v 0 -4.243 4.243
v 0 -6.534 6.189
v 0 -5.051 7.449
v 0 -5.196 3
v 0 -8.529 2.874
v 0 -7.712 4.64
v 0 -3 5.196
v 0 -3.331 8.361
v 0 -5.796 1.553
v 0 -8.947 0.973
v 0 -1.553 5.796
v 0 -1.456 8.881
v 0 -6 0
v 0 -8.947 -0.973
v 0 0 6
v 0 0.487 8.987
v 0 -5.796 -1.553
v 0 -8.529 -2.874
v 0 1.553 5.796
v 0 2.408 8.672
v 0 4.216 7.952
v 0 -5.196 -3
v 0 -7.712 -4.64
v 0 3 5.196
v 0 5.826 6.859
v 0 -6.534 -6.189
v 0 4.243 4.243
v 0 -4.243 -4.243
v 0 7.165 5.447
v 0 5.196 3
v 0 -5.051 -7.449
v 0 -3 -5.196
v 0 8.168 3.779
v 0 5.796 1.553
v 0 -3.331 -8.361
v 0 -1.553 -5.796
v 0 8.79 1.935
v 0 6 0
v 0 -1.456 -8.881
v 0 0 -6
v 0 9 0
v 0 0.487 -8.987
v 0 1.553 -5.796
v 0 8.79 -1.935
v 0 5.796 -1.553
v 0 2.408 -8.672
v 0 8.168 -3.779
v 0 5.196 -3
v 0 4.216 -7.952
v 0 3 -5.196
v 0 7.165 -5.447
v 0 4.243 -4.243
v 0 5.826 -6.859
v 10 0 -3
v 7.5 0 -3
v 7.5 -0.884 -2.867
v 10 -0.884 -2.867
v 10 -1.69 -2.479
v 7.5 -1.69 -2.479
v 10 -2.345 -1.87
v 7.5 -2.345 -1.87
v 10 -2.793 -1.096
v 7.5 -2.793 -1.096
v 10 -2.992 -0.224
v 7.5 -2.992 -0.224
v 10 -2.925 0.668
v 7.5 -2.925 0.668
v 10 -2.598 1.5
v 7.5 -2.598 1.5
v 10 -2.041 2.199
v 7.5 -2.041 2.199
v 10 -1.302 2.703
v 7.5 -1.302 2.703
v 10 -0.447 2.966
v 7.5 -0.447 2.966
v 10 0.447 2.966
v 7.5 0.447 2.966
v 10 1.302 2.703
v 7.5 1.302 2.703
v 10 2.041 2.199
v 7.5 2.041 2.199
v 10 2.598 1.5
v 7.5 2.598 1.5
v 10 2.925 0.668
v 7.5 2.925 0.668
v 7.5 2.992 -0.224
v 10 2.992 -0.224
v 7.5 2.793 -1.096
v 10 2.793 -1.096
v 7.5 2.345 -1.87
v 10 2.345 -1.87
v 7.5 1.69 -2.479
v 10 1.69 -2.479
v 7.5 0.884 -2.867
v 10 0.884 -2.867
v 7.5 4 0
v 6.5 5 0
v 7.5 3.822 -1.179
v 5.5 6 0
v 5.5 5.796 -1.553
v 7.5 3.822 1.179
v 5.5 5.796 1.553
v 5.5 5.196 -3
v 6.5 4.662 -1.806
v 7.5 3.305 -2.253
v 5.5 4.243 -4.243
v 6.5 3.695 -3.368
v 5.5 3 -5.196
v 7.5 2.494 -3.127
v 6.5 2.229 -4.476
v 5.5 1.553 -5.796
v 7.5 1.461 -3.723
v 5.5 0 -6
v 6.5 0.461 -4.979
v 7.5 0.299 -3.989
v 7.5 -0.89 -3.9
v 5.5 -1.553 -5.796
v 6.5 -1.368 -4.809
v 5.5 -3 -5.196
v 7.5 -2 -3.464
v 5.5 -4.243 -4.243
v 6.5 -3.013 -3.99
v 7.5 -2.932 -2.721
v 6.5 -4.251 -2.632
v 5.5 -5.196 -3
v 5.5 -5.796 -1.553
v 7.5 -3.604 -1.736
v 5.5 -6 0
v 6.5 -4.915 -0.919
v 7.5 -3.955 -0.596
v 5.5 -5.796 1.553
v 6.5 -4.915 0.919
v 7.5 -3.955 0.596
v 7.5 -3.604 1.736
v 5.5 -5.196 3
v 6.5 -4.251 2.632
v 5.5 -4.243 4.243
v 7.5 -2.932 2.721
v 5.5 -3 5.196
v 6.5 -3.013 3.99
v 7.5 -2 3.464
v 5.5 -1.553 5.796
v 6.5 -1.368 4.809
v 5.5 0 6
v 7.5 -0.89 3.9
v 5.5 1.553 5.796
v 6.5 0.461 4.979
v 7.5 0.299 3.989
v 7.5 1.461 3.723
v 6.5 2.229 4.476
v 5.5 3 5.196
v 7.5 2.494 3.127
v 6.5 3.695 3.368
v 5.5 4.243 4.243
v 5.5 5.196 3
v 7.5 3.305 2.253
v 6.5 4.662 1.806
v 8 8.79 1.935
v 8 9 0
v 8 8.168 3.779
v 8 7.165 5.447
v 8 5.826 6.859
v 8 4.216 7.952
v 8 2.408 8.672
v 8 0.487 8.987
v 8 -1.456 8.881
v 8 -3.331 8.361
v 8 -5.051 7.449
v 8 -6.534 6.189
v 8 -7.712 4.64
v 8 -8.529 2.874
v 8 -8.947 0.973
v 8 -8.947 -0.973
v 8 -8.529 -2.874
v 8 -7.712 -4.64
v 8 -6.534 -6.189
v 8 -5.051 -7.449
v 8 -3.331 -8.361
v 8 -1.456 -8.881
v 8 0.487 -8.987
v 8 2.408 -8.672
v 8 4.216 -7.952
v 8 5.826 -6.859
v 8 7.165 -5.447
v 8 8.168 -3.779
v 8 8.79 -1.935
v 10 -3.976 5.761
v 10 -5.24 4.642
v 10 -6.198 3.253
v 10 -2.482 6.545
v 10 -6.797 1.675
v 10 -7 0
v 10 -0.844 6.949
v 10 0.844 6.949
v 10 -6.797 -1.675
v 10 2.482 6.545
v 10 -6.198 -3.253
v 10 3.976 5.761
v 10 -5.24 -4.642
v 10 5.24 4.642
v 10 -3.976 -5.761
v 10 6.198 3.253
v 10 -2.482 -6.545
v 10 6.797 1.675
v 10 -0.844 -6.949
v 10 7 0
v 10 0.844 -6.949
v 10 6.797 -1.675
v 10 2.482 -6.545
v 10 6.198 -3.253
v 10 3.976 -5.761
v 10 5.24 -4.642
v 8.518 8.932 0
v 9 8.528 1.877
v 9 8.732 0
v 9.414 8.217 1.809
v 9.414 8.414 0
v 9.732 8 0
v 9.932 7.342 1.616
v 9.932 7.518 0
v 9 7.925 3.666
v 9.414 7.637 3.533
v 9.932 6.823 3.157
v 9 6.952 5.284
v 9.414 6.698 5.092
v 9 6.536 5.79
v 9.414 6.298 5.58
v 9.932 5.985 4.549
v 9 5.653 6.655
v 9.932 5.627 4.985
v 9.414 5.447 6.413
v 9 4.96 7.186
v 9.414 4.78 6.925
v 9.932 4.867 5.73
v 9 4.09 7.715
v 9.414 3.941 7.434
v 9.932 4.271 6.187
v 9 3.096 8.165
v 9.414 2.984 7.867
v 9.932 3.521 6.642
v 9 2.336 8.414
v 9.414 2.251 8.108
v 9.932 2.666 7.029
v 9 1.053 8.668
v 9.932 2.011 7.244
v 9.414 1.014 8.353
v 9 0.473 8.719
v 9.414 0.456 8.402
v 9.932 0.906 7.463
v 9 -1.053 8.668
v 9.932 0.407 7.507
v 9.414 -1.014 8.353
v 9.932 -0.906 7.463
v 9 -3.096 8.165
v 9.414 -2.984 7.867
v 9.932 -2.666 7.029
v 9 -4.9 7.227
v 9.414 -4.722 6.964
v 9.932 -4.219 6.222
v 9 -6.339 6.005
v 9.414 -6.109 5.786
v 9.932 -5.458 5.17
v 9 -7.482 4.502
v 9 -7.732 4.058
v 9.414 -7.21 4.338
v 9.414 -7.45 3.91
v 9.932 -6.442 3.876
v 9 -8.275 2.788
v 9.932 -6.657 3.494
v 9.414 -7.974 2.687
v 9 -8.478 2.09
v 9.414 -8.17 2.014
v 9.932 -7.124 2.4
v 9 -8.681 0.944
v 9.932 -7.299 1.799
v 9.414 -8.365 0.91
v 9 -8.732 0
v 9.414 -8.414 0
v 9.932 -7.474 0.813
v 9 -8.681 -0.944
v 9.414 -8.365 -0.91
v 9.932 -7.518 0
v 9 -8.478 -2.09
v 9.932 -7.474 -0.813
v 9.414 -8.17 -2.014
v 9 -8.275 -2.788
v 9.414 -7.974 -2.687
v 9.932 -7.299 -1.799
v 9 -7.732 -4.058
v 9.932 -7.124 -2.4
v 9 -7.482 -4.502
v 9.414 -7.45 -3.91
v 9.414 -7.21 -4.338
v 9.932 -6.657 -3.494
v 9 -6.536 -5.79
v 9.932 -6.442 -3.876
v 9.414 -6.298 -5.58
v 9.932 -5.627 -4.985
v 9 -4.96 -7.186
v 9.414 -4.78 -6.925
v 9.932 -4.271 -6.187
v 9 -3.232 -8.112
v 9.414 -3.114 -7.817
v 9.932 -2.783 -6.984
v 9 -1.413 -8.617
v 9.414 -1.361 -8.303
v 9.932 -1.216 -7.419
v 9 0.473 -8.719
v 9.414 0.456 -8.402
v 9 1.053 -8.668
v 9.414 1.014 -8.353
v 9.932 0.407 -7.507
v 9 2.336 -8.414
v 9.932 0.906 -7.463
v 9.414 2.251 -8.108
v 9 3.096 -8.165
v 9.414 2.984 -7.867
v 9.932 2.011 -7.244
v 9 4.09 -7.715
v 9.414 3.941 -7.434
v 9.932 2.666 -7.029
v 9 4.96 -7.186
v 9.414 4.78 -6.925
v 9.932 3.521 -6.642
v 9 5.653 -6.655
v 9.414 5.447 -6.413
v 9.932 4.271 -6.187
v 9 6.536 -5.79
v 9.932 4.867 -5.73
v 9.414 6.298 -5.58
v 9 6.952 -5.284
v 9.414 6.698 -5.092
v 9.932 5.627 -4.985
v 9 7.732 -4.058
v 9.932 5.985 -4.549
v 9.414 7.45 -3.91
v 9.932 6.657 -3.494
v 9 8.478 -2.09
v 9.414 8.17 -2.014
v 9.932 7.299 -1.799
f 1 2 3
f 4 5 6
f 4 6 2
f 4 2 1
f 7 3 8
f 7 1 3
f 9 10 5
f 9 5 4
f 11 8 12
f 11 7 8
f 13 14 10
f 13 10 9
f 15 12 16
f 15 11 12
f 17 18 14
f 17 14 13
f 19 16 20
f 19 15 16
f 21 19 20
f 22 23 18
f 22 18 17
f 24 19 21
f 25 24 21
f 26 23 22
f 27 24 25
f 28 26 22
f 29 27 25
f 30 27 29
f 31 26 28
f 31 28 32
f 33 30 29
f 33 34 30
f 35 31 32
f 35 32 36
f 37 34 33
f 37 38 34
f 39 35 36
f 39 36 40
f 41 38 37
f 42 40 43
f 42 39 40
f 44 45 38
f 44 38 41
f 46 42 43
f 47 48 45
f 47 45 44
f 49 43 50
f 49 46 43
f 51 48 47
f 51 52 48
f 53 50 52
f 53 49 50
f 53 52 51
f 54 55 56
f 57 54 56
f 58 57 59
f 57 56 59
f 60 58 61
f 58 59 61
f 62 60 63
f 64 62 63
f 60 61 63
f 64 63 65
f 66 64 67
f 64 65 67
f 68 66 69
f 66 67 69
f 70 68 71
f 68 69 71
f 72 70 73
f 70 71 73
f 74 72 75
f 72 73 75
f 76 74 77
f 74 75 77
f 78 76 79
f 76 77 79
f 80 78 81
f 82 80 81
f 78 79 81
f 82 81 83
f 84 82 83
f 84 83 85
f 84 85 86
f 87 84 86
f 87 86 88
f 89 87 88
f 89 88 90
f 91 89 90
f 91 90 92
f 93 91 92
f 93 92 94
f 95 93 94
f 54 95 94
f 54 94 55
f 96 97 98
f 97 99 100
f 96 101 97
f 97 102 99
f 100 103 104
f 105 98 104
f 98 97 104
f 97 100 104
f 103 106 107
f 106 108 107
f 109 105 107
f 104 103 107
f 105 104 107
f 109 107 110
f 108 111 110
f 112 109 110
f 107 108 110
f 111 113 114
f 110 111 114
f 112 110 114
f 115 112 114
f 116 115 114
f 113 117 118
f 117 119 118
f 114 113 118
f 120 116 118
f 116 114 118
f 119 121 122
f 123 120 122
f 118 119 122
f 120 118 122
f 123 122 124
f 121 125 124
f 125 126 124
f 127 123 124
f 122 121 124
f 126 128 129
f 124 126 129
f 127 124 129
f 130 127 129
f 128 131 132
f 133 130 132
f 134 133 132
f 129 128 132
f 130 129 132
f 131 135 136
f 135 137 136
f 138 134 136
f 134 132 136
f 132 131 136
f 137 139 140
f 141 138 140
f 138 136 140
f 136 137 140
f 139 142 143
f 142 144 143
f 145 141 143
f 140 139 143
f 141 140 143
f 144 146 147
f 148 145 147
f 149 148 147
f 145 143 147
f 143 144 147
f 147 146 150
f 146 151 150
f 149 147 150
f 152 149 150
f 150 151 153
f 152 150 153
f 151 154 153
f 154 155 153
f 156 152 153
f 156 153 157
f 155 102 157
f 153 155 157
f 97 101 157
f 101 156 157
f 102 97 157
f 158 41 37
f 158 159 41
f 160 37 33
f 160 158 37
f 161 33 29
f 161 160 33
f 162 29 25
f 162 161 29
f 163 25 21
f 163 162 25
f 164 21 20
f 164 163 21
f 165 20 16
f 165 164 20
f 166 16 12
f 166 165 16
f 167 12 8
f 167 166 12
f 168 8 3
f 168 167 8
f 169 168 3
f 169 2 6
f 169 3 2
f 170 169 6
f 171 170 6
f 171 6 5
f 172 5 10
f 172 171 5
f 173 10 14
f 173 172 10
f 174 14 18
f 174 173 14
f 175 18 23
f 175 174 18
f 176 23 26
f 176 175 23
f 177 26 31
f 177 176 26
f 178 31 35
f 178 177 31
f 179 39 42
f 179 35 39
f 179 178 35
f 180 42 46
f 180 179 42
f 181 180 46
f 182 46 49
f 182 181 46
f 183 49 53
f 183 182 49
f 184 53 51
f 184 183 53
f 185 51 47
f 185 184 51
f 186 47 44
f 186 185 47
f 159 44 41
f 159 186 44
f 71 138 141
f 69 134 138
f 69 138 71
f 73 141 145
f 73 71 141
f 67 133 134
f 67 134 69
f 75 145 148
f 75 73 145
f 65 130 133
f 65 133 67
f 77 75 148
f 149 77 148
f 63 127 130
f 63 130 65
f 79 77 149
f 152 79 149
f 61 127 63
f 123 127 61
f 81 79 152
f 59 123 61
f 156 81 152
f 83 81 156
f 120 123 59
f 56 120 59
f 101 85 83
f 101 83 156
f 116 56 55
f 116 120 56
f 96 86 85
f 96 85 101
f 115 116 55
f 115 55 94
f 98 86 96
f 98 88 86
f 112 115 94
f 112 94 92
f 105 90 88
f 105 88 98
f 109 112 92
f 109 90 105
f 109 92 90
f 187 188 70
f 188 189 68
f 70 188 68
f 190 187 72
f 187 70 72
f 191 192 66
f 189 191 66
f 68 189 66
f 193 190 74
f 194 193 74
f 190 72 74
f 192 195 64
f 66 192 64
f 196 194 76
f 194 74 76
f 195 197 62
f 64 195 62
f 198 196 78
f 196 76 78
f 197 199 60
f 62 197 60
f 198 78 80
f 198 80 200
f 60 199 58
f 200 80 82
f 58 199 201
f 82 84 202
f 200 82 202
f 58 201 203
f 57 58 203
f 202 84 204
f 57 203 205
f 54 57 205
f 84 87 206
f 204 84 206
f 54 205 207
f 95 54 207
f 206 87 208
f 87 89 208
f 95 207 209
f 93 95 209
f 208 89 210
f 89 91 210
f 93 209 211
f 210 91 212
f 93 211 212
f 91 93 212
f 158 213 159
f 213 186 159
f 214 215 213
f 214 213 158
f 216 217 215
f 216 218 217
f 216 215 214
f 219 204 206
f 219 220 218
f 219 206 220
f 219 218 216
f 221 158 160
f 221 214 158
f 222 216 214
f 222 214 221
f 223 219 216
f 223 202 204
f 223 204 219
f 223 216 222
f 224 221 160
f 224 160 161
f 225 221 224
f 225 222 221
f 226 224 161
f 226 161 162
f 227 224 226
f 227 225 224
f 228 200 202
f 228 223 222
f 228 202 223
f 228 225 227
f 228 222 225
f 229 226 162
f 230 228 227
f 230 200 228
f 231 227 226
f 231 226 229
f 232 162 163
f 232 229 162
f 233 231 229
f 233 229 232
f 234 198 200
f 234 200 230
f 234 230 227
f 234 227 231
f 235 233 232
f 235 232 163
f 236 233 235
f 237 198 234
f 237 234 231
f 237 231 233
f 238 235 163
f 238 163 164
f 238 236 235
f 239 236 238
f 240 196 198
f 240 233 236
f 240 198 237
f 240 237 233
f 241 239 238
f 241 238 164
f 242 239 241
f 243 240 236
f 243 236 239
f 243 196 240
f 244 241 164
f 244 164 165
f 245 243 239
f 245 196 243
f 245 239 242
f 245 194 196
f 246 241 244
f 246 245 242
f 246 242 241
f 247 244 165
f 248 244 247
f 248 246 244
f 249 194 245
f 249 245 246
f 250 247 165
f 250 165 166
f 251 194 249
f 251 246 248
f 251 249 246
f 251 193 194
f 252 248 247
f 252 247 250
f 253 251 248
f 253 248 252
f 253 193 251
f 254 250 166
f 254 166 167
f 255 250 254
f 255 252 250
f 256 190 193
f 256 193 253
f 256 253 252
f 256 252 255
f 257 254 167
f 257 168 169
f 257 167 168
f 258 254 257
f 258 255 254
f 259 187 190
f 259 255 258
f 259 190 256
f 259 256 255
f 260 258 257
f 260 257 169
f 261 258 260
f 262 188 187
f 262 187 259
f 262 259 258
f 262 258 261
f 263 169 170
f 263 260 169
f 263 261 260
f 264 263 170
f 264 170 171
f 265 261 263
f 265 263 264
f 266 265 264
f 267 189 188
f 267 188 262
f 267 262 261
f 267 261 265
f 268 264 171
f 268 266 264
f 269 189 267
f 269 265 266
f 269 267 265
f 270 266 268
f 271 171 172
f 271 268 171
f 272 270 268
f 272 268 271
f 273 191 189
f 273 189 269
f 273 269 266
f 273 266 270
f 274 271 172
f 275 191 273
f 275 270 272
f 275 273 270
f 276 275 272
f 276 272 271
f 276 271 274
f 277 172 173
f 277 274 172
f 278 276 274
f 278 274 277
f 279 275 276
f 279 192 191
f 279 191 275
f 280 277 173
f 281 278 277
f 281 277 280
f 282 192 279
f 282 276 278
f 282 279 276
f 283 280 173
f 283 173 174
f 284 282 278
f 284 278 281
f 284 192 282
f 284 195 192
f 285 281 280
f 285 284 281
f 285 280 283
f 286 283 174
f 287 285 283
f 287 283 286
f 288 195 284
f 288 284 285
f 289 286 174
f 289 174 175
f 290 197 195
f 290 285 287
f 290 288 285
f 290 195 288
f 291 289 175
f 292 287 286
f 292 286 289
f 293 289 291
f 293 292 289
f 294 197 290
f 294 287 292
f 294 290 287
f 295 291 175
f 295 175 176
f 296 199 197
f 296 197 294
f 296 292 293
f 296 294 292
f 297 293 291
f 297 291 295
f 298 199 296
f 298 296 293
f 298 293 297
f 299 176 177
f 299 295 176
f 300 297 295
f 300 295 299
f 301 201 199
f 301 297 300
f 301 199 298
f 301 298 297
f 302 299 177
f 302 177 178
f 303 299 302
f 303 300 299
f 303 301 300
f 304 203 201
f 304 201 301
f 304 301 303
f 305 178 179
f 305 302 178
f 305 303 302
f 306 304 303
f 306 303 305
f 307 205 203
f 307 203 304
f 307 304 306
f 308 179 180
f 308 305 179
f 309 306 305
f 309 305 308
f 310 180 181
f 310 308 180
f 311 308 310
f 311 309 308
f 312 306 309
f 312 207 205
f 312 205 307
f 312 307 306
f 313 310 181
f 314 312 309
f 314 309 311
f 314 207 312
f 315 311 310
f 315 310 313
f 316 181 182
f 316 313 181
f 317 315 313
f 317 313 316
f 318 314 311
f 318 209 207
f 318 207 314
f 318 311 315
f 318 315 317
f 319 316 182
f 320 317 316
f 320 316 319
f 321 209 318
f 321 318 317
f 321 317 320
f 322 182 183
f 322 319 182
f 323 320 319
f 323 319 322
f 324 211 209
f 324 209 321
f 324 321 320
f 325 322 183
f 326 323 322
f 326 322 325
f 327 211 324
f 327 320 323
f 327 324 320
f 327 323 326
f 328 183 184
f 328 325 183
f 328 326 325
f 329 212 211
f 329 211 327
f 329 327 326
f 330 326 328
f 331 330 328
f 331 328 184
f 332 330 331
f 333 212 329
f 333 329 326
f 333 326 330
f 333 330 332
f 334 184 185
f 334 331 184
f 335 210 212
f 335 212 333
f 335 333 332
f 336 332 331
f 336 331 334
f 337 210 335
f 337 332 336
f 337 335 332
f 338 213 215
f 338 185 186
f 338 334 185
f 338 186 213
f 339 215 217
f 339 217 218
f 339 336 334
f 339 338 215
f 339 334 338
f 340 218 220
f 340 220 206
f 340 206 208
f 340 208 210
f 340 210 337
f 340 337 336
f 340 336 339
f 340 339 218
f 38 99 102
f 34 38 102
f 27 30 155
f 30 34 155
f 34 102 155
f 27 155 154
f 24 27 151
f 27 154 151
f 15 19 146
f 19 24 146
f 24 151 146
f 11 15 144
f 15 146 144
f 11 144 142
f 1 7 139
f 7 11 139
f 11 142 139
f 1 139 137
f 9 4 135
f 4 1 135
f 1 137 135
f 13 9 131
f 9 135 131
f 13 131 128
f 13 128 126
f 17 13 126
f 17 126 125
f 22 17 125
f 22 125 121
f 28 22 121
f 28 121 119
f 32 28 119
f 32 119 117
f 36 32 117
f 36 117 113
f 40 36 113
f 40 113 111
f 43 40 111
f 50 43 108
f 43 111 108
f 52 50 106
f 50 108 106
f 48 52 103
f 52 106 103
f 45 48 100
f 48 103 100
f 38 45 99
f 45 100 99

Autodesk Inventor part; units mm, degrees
ref_plane "YZ Plane" through (0, 0, 0) normal (1, 0, 0) x (0, 1, 0)
ref_plane "XZ Plane" through (0, 0, 0) normal (0, 1, 0) x (-1, 0, 0)
ref_plane "XY Plane" through (0, 0, 0) normal (0, 0, 1) x (1, 0, 0)
sketch "Sketch1" plane through (0, 0, 0) normal (0, 0, 1) x (1, 0, 0)
  line L0 (0, 6) -> (0, 9)
  line L1 (0, 9) -> (10, 9)
  line L2 (10, 9) -> (10, 0)
  line L3 (10, 0) -> (0, 0)
  line L4 (0, 6) -> (5.5, 6)
  line L5 (5.5, 6) -> (7.5, 4)
  line L6 (7.5, 4) -> (7.5, 0)
  point P0 (5, 9)
  dimension "d0" = 45
  dimension "d1" = 18
  dimension "d2" = 12
  dimension "d3" = 2.5
  dimension "d4" = 10
  dimension "d5" = 2
revolve "Revolution1" add sketch "Sketch1" angle 360 about axis through (10, 0, 0) along (-1, 0, 0)
thread "Thread1" size "M12x1.75" class "6H" standard "ISO Metric profile" full length
sketch "Sketch2" plane through (10, 0, 0) normal (1, 0, 0) x (0, 0, -1)
  circle A0 centre (0, 0) radius 9 projected
hole "Hole1" at (10, 0, 0) direction (-1, 0, 0) diameter 6 end through all
fillet "Fillet1" radius 2 1 edges at (10, -9, 0)
properties part number "14.2"
